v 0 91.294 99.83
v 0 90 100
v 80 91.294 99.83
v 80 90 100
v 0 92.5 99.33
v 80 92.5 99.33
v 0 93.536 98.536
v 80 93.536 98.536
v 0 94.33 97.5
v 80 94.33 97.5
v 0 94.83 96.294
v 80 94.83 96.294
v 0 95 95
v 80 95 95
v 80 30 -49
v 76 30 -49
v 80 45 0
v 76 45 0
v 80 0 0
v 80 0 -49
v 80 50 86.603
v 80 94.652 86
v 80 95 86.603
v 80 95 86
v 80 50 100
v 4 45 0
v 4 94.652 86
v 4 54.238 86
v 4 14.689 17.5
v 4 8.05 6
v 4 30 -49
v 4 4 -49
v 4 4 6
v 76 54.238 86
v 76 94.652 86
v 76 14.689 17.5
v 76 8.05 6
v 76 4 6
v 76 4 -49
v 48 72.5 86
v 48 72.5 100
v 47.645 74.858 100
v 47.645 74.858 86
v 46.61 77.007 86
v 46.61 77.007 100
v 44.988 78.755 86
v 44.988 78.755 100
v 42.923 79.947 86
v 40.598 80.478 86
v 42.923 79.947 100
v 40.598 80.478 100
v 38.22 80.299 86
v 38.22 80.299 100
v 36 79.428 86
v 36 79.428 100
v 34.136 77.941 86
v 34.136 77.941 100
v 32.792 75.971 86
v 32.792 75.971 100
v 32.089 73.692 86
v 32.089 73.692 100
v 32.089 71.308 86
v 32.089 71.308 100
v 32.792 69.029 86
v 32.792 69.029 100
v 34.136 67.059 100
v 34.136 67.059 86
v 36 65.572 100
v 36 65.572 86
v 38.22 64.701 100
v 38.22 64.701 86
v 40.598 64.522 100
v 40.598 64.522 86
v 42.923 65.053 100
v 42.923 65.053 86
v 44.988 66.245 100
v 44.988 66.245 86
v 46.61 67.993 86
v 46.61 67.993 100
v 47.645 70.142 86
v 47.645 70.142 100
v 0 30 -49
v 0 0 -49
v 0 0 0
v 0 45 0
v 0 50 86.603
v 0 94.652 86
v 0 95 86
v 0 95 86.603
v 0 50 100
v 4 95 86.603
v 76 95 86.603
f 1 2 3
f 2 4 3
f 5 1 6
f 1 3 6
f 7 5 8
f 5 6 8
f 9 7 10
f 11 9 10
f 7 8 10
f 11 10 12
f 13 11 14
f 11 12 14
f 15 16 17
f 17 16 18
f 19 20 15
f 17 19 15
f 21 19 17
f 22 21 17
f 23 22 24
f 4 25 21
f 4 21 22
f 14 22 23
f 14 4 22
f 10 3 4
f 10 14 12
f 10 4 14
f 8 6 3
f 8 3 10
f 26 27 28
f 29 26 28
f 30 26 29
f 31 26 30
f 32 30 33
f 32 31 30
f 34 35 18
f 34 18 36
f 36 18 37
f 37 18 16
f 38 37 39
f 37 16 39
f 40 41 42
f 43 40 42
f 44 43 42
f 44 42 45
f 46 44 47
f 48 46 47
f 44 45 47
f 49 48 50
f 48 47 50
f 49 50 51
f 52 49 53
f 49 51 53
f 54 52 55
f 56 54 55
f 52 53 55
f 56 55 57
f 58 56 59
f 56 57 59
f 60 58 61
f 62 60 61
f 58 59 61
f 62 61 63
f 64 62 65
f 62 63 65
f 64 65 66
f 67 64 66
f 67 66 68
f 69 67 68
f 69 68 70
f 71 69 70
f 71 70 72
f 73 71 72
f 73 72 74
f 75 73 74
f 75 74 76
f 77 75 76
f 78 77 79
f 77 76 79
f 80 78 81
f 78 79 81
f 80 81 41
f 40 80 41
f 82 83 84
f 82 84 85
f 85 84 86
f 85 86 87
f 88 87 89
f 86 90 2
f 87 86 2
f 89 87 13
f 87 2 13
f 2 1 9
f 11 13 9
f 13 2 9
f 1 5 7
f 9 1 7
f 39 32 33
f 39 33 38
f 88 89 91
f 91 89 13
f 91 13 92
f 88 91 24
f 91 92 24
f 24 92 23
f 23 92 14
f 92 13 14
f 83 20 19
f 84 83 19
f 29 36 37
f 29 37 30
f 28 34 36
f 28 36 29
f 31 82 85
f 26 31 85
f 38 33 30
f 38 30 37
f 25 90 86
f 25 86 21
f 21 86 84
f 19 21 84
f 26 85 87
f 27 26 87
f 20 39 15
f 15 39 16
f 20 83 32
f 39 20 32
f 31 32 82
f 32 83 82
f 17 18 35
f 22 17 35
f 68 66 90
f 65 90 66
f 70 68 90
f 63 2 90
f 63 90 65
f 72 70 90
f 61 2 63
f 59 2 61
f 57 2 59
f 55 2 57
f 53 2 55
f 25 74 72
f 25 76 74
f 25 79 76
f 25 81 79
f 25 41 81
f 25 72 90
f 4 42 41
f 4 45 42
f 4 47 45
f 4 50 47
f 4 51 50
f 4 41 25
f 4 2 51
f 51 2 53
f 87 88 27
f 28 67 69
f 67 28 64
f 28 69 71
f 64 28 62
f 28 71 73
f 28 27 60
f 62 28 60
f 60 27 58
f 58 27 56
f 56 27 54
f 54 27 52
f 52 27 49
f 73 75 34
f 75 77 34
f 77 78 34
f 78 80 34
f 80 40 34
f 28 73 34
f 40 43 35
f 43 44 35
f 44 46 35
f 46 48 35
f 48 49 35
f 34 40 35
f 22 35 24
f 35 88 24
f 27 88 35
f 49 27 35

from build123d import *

# Parameters (mm, degrees)
F0_W      = 45
F0_H      = 49
F1_DEPTH  = 80
F3_DEPTH  = 35
F4_W      = 72
F4_H      = 41
F5_DEPTH  = 55
F6_W      = 72
F6_H      = 23
F7_DEPTH  = 15
F9_W      = 80
F9_H      = 45
F9_R      = 8
F10_DEPTH = 14
F11_R     = 5
F13_DEPTH = 80


with BuildPart() as f1:
    # F0 (on Right) → F1 (new body)
    with BuildSketch(Plane.YZ):
        with Locations((22.5, -24.5)):
            Rectangle(F0_W, F0_H)
        Polygon((50, 86.6025403784), (0, 0), (45, 0), (95, 86.6025403784), align=None)
    extrude(amount=F1_DEPTH)

    # F2 (on face) → F3 (cut)
    with BuildSketch(Plane(origin=(0, 33.75, -19.4855715851), x_dir=(-1, 0, 0), z_dir=(0, 0.8660254038, -0.5))):
        Polygon((-76, 22.5), (-4, 22.5), (-4, 117.5), (-4, 122.5), (-76, 122.5), (-76, 117.5), align=None)
    extrude(amount=-F3_DEPTH, mode=Mode.SUBTRACT)

    # F4 (on face) → F5 (cut)
    with BuildSketch(Plane(origin=(0, 0, -49), x_dir=(1, 0, 0), z_dir=(0, 0, -1))):
        with Locations((40, -24.5)):
            Rectangle(F4_W, F4_H)
    extrude(amount=-F5_DEPTH, mode=Mode.SUBTRACT)

    # F6 (on face) → F7 (cut)
    with BuildSketch(Plane(origin=(0, 11.25, 19.4855715851), x_dir=(1, 0, 0), z_dir=(0, 0.5, 0.8660254038))):
        with Locations((40, 15.4711431703)):
            Rectangle(F6_W, F6_H)
    extrude(amount=-F7_DEPTH, mode=Mode.SUBTRACT)

    # F9 (on offset) → F10 (join)
    with BuildSketch(Plane.XY.offset(100)):
        with Locations((40, 72.5)):
            Rectangle(F9_W, F9_H)
        with Locations((40, 72.5)):
            Circle(F9_R, mode=Mode.SUBTRACT)
    extrude(amount=-F10_DEPTH)

    # F11
    f11_edges = [f1.edges().sort_by_distance(p)[0] for p in [
        (40, 95, 100),
    ]]
    fillet(f11_edges, radius=F11_R)

    # F12 (on face) → F13 (cut)
    with BuildSketch(Plane(origin=(0, 0, 0), x_dir=(0, -1, 0), z_dir=(-1, 0, 0))):
        Polygon((-30, -49), (-45, 0), (-45, -49), align=None)
    extrude(amount=-F13_DEPTH, mode=Mode.SUBTRACT)


solid = f1.part
